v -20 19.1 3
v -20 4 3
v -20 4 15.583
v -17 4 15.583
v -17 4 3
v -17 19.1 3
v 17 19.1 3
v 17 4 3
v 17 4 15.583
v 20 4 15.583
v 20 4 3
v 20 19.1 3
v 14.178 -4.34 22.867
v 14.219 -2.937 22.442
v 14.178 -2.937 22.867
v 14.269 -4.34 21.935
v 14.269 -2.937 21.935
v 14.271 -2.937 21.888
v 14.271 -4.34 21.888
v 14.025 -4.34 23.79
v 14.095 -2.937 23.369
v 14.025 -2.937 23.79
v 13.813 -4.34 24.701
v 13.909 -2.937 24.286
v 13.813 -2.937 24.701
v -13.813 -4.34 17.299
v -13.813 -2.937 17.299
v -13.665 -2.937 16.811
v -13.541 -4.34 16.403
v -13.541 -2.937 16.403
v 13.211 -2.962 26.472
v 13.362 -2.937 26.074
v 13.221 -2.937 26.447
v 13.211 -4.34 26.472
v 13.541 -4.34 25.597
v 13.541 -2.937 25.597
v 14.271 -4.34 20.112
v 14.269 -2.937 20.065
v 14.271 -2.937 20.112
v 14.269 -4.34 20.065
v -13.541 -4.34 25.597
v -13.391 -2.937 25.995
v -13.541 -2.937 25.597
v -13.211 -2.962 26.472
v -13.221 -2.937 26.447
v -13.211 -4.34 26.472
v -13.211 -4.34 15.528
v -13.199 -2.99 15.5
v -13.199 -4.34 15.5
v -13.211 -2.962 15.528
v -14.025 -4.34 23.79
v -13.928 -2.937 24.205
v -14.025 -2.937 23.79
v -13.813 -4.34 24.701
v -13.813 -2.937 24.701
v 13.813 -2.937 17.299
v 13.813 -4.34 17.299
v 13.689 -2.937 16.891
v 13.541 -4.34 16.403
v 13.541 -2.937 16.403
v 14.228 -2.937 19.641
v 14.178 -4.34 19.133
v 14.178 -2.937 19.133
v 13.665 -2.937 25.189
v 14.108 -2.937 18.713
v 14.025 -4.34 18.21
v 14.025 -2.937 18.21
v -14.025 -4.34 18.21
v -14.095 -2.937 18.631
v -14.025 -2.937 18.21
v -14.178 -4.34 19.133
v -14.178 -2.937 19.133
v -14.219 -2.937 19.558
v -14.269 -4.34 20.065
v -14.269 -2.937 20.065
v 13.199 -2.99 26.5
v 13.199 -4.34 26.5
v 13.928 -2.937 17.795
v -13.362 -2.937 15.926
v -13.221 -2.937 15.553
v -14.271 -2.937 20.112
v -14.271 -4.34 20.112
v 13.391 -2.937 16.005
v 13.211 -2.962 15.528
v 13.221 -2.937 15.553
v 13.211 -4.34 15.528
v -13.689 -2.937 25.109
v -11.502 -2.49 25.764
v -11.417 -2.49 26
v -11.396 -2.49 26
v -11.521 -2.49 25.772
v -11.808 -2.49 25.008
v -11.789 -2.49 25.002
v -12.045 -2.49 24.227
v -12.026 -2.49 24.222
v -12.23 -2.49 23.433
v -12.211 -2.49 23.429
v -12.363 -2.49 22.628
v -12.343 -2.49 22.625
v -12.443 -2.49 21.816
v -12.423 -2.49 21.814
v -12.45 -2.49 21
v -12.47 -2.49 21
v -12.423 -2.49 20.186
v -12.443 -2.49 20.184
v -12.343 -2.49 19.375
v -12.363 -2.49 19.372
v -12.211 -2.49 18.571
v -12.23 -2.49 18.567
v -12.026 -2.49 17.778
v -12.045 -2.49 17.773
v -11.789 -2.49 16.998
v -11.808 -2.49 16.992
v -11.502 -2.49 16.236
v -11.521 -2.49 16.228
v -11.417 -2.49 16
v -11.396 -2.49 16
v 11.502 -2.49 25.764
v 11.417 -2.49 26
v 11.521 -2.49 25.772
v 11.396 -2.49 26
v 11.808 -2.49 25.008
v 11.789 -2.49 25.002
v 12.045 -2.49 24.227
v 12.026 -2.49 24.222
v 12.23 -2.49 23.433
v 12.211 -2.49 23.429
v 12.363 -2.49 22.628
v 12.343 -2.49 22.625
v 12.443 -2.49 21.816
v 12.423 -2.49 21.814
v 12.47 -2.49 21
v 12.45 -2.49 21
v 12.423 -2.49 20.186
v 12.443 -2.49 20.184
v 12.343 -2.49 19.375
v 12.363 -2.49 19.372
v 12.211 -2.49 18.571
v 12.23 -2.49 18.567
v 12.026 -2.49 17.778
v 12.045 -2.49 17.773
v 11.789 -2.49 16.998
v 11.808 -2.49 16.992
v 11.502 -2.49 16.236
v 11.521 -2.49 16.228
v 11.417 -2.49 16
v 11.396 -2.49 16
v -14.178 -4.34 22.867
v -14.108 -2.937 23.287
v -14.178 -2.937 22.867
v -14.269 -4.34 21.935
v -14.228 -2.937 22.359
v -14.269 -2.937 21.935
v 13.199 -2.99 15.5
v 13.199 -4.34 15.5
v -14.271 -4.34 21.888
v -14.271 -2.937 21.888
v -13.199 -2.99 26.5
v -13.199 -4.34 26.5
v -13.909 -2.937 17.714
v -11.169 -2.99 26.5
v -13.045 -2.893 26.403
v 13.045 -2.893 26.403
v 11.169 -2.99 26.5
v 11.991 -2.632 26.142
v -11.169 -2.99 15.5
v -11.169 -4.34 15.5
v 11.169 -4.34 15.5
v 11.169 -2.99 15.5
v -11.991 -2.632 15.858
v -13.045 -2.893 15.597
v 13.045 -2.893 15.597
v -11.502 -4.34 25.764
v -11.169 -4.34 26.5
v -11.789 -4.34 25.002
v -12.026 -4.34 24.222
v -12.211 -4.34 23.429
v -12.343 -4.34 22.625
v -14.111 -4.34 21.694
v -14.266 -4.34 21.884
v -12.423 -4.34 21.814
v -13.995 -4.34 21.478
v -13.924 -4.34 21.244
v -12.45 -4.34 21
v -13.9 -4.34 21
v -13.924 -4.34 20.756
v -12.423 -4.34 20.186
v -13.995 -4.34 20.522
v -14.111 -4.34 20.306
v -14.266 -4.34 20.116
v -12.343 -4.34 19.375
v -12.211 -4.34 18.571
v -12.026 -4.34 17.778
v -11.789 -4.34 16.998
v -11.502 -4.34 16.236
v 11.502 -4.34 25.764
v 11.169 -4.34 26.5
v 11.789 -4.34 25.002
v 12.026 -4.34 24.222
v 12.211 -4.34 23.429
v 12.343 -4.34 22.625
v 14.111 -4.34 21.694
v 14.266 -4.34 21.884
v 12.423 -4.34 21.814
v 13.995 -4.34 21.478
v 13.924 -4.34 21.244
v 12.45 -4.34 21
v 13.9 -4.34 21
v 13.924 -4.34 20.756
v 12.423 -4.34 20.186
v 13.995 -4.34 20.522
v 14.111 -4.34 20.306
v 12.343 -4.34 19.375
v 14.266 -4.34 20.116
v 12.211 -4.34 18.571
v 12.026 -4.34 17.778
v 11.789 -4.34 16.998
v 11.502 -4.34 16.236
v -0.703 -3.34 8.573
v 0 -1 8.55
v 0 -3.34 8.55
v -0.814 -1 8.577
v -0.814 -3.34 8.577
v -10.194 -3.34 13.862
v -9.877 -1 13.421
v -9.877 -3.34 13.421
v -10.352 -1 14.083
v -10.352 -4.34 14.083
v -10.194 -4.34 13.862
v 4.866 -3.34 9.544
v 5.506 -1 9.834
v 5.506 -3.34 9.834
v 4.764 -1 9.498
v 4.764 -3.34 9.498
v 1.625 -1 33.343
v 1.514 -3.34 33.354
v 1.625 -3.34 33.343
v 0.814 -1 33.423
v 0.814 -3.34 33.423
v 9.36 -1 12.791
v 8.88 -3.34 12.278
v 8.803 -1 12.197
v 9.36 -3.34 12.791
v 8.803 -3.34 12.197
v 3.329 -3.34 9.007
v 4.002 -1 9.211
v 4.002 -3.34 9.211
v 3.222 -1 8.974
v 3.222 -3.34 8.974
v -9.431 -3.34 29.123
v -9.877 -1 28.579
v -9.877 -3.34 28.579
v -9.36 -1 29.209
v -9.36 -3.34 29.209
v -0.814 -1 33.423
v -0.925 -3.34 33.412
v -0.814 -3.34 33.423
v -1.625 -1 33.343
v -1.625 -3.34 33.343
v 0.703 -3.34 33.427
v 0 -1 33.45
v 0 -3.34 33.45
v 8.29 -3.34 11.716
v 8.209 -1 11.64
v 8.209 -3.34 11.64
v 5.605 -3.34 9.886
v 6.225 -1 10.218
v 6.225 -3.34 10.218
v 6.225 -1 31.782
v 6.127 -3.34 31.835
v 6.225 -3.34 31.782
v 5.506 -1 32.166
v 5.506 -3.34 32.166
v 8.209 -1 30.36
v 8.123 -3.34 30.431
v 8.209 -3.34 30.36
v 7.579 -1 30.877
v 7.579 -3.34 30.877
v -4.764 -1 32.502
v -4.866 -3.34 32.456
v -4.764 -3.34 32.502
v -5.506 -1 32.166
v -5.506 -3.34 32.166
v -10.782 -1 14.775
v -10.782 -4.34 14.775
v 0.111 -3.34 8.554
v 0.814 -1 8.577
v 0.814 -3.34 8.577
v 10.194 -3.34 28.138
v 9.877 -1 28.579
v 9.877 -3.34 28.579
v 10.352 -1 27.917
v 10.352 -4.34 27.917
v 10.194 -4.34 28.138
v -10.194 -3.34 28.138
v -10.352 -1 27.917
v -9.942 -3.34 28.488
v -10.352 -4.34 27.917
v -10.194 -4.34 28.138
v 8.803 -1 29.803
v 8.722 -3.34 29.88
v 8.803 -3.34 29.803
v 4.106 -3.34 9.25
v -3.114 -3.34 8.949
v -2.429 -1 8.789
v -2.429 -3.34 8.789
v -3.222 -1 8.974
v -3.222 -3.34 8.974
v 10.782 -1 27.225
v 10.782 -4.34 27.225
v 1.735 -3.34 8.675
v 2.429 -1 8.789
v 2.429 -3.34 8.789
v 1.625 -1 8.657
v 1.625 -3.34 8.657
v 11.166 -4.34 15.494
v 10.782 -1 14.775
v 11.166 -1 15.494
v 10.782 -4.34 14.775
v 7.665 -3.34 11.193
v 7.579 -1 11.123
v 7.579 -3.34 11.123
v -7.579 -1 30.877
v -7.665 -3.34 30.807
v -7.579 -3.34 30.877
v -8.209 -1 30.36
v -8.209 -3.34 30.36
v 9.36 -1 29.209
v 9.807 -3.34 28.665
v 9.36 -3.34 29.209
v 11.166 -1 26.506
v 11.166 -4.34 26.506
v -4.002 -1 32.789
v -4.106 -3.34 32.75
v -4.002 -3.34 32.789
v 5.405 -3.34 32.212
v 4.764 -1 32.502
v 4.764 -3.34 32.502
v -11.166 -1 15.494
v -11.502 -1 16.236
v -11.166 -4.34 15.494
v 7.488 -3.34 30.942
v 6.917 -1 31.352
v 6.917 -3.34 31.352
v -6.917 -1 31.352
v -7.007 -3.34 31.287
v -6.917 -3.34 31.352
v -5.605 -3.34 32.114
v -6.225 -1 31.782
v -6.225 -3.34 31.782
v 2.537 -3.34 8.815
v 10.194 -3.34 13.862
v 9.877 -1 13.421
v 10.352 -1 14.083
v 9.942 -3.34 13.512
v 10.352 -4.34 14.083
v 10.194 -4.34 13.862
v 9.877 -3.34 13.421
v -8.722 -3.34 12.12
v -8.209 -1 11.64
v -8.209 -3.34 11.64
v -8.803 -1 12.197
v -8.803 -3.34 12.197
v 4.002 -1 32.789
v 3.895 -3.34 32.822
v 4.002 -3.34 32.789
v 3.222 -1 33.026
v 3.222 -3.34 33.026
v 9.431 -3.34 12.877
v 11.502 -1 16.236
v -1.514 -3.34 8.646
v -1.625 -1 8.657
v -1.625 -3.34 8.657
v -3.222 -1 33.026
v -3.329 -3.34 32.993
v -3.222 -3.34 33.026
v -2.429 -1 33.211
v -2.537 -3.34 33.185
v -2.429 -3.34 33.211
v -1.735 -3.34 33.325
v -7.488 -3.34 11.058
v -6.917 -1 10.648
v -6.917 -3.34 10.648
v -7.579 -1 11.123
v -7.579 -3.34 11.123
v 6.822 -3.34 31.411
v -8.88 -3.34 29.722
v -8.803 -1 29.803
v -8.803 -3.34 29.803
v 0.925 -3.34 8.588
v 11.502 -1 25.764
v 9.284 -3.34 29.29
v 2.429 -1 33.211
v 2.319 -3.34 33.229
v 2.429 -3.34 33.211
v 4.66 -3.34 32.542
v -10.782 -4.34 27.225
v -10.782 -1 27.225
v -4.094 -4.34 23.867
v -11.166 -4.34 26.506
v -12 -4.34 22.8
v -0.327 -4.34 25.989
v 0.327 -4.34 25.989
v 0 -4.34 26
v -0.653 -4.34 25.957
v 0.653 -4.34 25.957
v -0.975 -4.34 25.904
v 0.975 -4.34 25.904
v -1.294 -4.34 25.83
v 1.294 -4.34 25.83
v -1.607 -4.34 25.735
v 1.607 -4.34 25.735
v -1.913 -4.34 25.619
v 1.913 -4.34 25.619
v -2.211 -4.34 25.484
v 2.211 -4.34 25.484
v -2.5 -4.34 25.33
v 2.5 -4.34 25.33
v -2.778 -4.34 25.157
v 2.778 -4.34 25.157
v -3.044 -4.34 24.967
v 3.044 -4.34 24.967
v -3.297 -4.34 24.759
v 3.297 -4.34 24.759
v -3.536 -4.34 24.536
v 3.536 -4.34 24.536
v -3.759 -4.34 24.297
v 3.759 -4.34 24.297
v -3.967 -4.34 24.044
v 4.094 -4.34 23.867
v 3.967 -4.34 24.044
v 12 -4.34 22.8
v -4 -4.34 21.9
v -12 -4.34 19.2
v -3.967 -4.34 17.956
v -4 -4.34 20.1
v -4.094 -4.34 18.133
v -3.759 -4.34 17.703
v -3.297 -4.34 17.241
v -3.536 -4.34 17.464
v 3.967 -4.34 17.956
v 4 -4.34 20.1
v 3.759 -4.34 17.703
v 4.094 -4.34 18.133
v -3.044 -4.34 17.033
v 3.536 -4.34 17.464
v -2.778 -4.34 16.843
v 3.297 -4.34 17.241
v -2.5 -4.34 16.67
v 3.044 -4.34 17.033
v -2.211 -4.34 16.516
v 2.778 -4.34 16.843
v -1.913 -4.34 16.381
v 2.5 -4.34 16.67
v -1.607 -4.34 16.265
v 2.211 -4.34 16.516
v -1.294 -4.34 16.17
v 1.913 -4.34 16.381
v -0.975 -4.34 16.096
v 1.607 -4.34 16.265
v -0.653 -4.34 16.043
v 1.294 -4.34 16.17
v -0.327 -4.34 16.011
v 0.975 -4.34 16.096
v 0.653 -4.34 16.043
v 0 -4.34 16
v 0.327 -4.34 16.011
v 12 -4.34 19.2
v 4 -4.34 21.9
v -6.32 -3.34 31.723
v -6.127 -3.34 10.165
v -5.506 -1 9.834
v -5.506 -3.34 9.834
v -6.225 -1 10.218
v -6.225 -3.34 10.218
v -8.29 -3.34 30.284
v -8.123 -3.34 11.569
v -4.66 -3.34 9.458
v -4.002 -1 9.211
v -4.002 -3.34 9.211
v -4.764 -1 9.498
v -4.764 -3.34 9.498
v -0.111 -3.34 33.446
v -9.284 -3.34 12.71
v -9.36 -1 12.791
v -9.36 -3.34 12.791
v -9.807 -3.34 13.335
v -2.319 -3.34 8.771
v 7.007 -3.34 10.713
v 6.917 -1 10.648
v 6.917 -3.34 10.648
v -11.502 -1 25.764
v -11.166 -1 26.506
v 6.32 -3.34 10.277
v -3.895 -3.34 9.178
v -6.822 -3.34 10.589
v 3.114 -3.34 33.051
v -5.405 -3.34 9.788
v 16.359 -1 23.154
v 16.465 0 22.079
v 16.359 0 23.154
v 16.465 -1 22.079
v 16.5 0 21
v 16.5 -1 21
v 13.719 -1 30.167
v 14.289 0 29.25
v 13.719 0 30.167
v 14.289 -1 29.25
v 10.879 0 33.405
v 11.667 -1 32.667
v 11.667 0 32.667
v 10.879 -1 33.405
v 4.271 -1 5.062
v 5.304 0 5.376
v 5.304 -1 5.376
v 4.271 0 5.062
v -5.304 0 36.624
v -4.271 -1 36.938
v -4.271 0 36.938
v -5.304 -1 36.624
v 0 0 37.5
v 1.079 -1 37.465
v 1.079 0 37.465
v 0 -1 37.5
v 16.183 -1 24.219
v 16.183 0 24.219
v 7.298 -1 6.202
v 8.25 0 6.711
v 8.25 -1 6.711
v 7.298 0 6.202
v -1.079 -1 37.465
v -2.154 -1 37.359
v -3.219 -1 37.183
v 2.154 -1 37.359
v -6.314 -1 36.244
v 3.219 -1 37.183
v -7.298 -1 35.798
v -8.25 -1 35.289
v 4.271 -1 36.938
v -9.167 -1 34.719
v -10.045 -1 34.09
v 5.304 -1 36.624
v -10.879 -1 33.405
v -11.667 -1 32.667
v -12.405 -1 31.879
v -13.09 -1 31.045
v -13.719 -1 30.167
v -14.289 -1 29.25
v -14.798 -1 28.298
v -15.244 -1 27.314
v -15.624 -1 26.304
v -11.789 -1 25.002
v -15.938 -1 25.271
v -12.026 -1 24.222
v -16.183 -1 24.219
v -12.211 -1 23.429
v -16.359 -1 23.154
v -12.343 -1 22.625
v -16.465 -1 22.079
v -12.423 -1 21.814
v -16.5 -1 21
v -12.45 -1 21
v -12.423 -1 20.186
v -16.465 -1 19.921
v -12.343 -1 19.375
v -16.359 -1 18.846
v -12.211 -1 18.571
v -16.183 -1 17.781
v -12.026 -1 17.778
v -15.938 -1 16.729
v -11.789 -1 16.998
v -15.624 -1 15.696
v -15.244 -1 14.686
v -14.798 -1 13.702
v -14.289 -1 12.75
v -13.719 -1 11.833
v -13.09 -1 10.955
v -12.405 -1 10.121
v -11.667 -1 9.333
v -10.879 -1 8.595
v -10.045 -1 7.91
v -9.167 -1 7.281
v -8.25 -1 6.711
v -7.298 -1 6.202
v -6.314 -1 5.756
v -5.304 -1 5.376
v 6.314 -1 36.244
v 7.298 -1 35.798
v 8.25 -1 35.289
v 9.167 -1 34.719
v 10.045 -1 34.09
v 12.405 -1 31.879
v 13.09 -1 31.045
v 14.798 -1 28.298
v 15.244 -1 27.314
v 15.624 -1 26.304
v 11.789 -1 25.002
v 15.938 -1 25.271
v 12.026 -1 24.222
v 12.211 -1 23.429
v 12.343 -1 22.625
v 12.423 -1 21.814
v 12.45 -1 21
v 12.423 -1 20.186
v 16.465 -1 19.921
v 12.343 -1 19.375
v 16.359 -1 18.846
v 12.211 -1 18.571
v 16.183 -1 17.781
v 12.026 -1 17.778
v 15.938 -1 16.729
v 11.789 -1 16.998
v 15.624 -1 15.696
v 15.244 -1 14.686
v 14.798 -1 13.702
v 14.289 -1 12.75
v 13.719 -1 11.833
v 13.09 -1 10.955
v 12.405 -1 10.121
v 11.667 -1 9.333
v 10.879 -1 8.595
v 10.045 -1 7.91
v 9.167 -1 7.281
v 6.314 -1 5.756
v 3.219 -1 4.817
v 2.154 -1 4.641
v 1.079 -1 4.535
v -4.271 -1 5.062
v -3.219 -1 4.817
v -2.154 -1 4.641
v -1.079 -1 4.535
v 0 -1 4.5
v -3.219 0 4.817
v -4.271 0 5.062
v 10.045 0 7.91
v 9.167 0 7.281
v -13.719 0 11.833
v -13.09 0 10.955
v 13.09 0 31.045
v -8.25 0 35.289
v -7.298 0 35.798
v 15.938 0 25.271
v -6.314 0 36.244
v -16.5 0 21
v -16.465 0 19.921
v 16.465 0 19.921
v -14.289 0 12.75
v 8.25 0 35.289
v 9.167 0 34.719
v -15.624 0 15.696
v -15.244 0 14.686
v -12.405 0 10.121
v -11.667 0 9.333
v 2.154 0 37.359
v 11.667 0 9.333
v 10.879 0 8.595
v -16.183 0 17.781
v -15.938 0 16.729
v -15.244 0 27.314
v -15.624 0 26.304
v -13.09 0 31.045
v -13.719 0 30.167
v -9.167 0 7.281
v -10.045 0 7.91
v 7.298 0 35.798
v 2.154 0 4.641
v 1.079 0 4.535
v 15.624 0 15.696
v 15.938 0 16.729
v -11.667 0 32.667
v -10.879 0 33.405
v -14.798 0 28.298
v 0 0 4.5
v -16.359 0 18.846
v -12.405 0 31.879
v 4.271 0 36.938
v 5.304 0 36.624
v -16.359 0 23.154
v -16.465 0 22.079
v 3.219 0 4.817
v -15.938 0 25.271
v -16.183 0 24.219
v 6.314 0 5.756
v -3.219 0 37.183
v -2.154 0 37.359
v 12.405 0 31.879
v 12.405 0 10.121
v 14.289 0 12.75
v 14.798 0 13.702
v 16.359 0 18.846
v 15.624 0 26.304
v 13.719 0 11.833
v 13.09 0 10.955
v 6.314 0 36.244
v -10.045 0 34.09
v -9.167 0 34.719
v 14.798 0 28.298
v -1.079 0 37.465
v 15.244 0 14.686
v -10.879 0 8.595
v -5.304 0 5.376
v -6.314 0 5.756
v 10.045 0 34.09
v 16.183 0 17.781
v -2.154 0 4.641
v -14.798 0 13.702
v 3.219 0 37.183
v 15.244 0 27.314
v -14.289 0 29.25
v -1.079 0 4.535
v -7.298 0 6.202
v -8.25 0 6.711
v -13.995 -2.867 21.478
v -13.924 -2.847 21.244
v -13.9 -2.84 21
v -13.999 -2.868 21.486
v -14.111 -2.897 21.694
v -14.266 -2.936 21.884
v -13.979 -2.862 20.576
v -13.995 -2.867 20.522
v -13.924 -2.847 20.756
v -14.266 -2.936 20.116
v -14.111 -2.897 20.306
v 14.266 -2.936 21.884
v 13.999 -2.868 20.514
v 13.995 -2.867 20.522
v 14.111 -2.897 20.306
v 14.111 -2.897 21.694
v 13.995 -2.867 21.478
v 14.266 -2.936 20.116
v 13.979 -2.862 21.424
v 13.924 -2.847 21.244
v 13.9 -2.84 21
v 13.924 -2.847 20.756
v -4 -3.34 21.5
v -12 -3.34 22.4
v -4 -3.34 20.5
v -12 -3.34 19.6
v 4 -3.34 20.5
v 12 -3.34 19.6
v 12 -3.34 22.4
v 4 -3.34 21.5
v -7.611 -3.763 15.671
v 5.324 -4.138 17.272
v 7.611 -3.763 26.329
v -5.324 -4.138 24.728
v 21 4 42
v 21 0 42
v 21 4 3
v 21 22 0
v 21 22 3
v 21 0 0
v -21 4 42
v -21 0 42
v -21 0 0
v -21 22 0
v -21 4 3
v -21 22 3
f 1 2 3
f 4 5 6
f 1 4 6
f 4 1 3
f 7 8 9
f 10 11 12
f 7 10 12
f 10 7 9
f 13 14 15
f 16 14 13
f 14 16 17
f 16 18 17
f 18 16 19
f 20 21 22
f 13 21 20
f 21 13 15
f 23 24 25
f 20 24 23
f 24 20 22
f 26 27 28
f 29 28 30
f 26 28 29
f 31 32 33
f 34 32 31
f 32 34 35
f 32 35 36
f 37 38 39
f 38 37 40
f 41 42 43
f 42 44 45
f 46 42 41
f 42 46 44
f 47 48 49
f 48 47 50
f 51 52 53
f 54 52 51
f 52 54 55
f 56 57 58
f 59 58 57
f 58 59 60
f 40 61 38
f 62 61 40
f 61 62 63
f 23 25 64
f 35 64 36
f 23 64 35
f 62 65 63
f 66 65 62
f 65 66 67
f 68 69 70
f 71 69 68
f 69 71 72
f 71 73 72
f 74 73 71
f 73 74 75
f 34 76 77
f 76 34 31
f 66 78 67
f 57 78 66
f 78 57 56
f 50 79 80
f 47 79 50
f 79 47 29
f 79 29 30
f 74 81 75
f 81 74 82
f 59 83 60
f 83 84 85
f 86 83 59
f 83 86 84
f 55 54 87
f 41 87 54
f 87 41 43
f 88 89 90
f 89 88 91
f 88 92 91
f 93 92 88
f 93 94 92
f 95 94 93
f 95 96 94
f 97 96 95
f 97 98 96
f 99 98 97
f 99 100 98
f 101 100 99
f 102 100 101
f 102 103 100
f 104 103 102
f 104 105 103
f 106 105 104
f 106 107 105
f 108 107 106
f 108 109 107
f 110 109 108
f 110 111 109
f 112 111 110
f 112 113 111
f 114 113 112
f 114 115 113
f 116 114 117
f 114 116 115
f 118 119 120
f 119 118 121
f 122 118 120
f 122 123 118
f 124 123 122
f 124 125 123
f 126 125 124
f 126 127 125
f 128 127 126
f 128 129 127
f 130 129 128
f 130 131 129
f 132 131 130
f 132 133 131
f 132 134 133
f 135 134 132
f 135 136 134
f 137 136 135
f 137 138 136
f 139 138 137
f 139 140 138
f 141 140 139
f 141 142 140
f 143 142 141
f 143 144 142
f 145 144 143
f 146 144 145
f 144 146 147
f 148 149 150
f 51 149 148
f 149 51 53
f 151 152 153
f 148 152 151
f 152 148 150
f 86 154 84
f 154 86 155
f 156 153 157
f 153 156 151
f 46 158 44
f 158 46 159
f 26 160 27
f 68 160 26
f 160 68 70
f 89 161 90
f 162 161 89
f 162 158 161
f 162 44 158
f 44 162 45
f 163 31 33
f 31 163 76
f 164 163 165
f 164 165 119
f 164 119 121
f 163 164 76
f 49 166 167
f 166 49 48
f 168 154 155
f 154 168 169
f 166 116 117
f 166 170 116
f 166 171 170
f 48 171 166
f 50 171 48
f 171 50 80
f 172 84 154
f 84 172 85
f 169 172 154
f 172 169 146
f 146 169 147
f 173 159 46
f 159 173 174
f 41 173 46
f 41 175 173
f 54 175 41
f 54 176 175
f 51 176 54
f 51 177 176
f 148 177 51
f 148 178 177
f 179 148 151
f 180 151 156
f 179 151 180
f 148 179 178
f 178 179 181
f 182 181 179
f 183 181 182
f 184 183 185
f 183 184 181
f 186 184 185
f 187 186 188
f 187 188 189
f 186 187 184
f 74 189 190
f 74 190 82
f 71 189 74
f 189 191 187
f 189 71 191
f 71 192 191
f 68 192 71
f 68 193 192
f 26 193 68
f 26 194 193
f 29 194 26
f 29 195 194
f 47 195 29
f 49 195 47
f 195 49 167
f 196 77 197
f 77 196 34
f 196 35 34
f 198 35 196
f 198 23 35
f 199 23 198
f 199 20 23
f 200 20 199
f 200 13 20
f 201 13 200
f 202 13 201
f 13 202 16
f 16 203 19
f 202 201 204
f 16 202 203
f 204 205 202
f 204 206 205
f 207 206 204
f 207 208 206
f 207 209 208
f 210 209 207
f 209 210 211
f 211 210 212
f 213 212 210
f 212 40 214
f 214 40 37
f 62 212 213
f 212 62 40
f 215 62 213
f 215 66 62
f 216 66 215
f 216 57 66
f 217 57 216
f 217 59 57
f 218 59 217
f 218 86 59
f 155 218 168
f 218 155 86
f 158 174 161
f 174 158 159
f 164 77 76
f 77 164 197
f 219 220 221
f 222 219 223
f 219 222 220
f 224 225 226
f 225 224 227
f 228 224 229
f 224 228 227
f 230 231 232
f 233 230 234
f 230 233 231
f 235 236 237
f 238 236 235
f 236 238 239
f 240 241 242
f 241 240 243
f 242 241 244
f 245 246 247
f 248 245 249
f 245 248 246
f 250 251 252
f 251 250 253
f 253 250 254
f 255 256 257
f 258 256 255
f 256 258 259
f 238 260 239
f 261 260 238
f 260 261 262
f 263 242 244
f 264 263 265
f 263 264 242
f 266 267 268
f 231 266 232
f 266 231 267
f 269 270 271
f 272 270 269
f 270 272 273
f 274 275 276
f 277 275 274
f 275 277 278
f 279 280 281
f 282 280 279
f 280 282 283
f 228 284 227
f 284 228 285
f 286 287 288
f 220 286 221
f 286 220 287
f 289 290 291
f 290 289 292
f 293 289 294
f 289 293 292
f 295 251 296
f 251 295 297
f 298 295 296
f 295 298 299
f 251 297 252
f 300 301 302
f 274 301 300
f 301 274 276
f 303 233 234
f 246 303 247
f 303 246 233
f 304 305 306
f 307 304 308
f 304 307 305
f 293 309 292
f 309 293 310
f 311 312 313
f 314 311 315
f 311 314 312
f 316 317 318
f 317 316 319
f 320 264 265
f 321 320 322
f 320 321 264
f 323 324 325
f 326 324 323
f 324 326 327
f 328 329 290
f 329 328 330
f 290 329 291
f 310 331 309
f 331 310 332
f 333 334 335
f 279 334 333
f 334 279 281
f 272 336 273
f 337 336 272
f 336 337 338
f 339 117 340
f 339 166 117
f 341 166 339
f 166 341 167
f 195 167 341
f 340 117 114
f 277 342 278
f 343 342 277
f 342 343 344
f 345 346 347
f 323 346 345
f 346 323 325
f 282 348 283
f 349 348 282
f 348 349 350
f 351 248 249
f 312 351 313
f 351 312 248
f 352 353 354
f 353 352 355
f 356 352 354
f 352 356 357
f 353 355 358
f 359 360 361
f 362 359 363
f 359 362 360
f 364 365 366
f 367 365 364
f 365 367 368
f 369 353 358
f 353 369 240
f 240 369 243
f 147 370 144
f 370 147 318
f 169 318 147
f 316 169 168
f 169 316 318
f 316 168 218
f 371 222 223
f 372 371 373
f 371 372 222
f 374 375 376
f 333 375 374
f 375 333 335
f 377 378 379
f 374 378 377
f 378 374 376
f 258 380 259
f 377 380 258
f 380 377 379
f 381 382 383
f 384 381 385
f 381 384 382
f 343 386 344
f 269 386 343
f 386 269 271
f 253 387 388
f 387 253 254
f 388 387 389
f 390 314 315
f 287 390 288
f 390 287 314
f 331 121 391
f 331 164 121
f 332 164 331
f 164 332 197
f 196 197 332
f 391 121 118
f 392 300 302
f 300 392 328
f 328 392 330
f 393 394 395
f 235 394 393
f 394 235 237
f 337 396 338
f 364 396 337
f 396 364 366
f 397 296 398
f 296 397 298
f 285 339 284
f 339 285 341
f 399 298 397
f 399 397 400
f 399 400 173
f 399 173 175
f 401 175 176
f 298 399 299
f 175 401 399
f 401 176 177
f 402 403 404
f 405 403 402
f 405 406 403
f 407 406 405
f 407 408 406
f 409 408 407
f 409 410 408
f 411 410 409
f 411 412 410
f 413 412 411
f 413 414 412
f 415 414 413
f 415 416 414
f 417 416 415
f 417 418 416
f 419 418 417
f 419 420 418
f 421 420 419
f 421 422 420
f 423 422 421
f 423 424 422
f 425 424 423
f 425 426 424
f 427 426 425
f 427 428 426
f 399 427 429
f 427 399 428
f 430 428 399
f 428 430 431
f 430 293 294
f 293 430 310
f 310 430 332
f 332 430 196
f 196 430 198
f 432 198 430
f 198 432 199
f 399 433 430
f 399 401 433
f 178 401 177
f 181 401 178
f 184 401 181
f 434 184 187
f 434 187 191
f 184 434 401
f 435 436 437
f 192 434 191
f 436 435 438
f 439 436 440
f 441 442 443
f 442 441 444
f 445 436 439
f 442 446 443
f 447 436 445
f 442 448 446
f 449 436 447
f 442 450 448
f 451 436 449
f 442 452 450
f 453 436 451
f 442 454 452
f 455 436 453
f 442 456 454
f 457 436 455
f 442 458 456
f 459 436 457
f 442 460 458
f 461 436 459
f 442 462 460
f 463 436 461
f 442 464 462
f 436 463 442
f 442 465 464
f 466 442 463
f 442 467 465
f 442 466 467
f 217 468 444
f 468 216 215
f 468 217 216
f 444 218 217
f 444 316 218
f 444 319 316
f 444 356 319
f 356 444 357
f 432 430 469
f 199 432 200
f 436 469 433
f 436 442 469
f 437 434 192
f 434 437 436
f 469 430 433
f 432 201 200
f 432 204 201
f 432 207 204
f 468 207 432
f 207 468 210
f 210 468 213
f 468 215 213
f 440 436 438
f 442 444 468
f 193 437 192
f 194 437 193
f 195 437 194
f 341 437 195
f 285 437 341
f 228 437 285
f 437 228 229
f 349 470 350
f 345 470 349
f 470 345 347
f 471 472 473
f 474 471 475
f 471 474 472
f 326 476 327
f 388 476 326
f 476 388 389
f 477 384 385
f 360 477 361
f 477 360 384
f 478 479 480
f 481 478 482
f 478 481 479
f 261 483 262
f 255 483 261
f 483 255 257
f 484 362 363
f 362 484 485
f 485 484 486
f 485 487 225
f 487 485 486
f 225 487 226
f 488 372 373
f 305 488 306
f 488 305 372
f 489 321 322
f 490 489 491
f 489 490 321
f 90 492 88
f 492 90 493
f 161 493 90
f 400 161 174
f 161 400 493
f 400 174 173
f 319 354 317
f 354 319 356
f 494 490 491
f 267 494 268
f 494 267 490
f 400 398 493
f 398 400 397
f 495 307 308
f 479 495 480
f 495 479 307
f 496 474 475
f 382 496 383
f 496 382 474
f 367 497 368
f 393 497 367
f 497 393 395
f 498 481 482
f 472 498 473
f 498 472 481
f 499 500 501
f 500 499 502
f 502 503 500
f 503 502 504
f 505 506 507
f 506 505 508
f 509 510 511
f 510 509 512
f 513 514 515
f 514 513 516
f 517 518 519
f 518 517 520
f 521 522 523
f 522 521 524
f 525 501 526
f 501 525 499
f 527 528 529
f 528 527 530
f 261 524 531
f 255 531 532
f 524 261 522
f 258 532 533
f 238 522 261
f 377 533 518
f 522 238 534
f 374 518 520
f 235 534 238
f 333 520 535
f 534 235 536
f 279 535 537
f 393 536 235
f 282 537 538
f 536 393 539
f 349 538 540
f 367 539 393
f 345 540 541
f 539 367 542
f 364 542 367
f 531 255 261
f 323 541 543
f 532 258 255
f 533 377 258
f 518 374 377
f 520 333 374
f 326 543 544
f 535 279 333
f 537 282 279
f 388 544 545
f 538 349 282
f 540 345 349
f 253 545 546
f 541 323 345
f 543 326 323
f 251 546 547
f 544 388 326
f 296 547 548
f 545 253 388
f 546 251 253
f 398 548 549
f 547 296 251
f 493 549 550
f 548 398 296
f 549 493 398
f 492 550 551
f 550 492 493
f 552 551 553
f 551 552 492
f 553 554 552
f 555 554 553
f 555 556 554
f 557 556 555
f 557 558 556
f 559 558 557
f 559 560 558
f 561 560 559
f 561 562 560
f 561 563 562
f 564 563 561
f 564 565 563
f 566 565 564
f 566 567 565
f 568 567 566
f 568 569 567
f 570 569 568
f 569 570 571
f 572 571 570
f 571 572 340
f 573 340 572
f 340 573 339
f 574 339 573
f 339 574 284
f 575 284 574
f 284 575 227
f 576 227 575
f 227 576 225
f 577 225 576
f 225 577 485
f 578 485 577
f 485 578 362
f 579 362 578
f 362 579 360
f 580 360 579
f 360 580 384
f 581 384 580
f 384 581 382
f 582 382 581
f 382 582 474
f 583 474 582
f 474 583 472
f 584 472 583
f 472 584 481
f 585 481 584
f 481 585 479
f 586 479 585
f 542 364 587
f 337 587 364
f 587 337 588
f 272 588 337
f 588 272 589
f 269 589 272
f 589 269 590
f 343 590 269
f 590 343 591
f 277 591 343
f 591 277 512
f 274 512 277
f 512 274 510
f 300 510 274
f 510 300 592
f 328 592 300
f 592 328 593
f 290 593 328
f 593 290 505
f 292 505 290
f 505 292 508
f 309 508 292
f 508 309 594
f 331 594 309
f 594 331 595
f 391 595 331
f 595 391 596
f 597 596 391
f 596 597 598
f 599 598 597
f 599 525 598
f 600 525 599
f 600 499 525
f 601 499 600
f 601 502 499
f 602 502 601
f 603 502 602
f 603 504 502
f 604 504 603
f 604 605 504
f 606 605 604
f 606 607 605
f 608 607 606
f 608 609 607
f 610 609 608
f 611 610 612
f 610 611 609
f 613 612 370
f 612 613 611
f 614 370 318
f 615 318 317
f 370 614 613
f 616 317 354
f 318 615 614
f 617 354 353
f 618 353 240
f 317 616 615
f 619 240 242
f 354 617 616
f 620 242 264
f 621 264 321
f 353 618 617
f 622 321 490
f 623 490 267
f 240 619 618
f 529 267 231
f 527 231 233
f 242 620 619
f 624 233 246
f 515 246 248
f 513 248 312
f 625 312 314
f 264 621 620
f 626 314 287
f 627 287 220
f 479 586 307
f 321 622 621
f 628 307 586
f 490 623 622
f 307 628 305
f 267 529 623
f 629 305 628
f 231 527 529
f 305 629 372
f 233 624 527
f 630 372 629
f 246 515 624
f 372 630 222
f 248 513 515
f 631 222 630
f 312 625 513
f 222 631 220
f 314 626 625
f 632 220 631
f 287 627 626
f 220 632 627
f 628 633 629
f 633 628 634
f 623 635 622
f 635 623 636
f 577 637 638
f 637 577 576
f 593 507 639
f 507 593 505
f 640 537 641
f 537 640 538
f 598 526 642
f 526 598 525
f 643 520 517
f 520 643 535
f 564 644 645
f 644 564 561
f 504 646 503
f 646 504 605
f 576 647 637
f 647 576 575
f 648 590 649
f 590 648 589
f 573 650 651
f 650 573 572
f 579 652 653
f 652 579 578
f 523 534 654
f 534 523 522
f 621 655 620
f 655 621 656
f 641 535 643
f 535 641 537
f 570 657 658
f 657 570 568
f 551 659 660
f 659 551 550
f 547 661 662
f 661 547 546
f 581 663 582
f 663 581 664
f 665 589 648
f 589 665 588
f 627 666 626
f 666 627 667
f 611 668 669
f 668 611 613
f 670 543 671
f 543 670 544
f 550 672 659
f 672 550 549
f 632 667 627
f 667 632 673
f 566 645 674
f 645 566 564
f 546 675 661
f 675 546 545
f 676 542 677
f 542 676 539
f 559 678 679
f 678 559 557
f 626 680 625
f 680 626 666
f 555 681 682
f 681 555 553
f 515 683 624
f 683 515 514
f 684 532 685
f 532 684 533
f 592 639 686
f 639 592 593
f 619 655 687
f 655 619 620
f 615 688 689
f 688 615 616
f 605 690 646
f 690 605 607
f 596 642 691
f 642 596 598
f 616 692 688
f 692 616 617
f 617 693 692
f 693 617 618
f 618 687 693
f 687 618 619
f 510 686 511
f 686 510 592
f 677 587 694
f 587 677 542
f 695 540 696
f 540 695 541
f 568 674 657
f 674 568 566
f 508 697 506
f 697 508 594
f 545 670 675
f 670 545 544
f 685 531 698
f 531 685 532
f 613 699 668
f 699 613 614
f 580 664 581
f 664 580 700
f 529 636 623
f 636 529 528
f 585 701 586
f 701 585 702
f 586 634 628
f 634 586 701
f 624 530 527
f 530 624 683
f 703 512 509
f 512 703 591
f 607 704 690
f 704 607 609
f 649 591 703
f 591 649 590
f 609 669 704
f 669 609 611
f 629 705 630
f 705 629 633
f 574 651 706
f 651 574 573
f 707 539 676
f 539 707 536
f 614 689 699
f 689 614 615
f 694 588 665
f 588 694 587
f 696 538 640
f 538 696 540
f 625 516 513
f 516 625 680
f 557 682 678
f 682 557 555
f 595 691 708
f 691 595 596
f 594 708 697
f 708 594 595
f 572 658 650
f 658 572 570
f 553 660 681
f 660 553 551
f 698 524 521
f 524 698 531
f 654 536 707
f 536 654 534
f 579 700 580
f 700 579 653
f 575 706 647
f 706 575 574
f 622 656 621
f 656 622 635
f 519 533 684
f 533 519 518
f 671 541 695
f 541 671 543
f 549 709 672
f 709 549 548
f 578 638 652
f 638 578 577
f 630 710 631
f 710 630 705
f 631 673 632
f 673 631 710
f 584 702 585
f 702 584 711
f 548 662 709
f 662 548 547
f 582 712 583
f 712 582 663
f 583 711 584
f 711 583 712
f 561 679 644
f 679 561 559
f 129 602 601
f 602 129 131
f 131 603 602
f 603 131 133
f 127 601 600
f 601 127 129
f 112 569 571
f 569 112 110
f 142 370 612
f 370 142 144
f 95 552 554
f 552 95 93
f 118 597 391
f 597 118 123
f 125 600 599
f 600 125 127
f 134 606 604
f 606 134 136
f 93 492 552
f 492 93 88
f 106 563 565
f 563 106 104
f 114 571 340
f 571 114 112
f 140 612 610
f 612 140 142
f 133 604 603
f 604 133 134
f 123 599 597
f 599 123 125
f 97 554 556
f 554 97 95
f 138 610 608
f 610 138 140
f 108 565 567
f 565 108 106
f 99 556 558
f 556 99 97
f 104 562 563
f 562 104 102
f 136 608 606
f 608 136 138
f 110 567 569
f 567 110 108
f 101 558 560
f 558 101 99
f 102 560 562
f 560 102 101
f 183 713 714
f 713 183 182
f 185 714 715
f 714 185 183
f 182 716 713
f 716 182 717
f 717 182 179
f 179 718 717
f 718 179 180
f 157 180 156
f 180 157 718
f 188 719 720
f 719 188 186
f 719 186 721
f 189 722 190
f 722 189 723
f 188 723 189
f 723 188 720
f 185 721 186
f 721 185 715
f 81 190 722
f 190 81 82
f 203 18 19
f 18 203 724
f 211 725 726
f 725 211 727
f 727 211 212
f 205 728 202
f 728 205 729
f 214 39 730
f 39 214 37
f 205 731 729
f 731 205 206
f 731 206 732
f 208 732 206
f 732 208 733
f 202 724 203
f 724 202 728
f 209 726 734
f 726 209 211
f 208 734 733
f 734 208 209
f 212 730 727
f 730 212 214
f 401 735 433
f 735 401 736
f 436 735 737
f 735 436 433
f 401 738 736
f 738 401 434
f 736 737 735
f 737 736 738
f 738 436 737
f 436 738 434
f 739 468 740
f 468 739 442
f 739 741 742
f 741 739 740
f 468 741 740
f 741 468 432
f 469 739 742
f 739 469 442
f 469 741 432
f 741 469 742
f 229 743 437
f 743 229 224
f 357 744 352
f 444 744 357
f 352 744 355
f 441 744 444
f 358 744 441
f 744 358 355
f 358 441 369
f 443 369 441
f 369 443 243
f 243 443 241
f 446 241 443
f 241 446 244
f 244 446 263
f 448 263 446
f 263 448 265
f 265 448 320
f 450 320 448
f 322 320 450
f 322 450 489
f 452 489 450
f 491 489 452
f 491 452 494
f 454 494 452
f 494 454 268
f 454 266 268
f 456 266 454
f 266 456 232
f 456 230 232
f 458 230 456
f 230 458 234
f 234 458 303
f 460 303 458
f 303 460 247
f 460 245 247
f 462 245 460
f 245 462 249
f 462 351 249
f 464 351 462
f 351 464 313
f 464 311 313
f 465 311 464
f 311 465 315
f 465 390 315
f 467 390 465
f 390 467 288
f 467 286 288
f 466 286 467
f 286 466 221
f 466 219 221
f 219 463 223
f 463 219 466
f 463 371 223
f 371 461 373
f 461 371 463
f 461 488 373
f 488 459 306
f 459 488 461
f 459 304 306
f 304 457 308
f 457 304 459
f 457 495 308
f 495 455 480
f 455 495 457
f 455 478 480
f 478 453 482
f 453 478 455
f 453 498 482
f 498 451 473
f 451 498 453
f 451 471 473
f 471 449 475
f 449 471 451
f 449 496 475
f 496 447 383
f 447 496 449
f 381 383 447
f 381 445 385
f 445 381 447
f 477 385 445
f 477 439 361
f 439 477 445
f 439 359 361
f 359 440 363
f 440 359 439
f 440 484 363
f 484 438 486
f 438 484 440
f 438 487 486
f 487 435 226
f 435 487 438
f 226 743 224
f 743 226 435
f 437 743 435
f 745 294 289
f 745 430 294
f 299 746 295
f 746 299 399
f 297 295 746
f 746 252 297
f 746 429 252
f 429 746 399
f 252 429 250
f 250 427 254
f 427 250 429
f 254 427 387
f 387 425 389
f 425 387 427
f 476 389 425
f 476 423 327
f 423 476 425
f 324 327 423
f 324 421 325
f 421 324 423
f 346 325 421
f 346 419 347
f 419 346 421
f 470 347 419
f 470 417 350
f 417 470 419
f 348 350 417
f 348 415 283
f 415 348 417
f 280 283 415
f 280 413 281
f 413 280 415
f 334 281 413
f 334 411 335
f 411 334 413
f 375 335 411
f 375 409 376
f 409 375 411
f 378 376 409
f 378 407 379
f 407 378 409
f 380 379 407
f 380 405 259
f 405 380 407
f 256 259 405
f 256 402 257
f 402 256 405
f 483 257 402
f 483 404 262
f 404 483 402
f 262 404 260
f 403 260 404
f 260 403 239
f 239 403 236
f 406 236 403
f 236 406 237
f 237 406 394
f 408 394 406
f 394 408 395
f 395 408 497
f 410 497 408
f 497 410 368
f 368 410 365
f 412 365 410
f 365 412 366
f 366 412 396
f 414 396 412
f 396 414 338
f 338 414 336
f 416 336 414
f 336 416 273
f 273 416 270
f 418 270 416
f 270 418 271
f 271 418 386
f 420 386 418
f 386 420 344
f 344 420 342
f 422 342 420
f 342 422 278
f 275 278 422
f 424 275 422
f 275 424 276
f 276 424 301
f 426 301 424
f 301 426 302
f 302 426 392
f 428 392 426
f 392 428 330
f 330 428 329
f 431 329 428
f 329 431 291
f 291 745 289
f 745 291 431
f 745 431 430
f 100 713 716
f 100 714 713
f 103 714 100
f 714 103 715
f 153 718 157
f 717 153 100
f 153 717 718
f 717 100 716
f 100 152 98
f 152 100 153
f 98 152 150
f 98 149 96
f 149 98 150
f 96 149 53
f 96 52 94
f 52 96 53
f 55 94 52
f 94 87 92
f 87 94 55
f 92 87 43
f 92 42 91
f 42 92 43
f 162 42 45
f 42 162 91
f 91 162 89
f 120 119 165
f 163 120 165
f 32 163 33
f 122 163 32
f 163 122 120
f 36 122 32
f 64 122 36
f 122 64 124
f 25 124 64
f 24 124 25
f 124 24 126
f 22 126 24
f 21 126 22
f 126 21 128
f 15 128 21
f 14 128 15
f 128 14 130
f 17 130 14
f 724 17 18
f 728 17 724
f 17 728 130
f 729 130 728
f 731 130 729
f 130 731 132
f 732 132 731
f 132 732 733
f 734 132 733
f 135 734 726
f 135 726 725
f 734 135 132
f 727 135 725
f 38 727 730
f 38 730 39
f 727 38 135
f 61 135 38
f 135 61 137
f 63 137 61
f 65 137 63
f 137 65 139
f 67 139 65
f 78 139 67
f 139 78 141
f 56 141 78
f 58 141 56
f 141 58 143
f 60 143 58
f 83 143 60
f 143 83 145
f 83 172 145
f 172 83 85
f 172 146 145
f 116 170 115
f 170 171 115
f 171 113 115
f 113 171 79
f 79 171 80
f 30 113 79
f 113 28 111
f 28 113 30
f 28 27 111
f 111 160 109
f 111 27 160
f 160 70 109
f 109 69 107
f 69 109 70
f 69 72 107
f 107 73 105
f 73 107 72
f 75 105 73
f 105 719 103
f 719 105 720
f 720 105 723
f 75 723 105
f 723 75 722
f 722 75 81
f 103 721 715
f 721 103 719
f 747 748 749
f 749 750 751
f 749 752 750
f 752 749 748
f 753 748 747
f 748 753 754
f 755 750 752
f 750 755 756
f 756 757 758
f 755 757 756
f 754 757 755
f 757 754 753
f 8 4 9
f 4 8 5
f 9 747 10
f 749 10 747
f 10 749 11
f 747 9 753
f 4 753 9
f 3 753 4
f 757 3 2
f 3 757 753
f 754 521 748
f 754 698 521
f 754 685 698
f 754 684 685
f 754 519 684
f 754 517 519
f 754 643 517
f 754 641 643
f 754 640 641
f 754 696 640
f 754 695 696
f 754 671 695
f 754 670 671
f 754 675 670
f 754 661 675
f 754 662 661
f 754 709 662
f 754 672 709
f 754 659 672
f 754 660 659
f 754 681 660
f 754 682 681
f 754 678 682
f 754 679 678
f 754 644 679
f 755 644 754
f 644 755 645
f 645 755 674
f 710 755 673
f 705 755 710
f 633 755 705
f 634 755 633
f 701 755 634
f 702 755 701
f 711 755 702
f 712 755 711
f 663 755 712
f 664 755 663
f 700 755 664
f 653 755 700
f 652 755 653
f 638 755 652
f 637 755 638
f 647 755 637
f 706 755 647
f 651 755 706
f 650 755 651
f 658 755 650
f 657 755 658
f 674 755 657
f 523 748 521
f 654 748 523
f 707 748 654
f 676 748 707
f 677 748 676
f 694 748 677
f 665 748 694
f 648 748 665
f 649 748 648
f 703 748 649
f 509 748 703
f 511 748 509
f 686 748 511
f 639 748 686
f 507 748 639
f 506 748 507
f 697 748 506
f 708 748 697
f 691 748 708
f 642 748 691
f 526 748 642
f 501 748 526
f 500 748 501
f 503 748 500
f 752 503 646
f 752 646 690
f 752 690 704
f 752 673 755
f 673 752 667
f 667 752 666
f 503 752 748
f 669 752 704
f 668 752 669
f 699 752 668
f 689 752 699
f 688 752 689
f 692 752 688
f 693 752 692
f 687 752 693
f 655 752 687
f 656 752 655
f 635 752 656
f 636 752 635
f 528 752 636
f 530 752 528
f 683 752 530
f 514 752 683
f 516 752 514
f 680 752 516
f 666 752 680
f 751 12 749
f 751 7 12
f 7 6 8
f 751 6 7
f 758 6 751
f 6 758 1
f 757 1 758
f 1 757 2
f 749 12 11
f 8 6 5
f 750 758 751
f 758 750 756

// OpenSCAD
// file: ../../lib/garmin_cleat.scad
// ============================================================
// Garmin-style quarter-turn cleat (male, "device side")
// Part of ControllerCyclingMounts.  Use with:  use <../../lib/garmin_cleat.scad>
//
// Dimensions measured from community cleats (DiTEC case,
// ReverseGarminCustom, Shiny Allis-Bojo) which share the same
// geometry within ~0.2 mm.
//
// Built pointing up (+Z) from z = 0, which is the surface it sits on.
// Lugs lie along X when angle = 0.
//
// v2 changes (after the first test print would drop in but not twist):
//   - lug undersides are chamfered: the gap for the mount's lip is
//     neck_h (1.5) at the neck and neck_h + lug_chamfer (1.95) at the
//     lug tip, like the DiTEC reference. This also removes the flat
//     1.8 mm overhang that sagged when the cleat was printed flat.
//   - the side edges of each lug are chamfered underneath
//     (lug_lead_in) so the mount's lip slides under easily.
//   - lugs are thicker at the root (lug_t 1.85) so the outer face sits
//     3.35 mm above the seat, as on the reference cleats.
// ============================================================

// Outer face height of the cleat above its mounting surface
function garmin_cleat_height(pedestal_h = 1.0, neck_h = 1.5, lug_t = 1.85) =
    pedestal_h + neck_h + lug_t;

module _gc_wedge2d(s, r0, r1, w0, w1) {
    polygon([[s * r0, w0/2], [s * r1, w1/2], [s * r1, -w1/2], [s * r0, -w0/2]]);
}

module garmin_cleat(angle = 0,
                    pedestal_d = 33, pedestal_h = 1.0,   // flat seat for the mount's lip
                    neck_d = 24.9, neck_h = 1.5,         // gap for the mount's lip, at the neck
                    lug_d = 28.6, lug_w = 11.0, lug_t = 1.85,  // lug_t measured at the neck
                    lug_chamfer = 0.45,   // extra gap at the lug tip (underside slope)
                    lug_lead_in = 0.5,    // 45-deg chamfer under each lug's side edges
                    lug_notch_d = 2.5, lug_notch_depth = 0.4,
                    // detent grooves along the lugs (springs click in when locked)
                    groove_r0 = 4, groove_r1 = 12, groove_w0 = 1.0, groove_w1 = 2.8,
                    groove_depth = 1.0, groove_draft = 0.4,
                    // lead-in ramps 90 deg from the lugs (springs sit here on insert)
                    ramp_r0 = 5, ramp_drop = 1.0, ramp_half_angle = 55) {
    eps = 0.01;
    z_lug = pedestal_h + neck_h;          // lug underside at the neck
    zt = z_lug + lug_t;                   // outer face
    r_n = neck_d / 2;
    r_l = lug_d / 2;
    difference() {
        union() {
            cylinder(d = pedestal_d, h = pedestal_h + eps, $fn = 96);
            translate([0, 0, pedestal_h]) cylinder(d = neck_d, h = neck_h + eps, $fn = 96);
            translate([0, 0, z_lug]) {
                cylinder(d = neck_d, h = lug_t, $fn = 96);
                rotate([0, 0, angle]) intersection() {
                    cylinder(d = lug_d, h = lug_t, $fn = 96);
                    // lug strip with chamfered lower side edges
                    rotate([90, 0, 90]) translate([0, 0, -r_l - 1])
                        linear_extrude(lug_d + 2)
                            polygon([[-lug_w/2 + lug_lead_in, 0], [lug_w/2 - lug_lead_in, 0],
                                     [lug_w/2, lug_lead_in], [lug_w/2, lug_t],
                                     [-lug_w/2, lug_t], [-lug_w/2, lug_lead_in]]);
                }
            }
        }
        // sloped lug underside: gap grows from neck_h at the neck to
        // neck_h + lug_chamfer at the lug tip
        if (lug_chamfer > 0) {
            r_far = r_l + 2;
            z_far = z_lug + lug_chamfer * (r_far - r_n) / (r_l - r_n);
            rotate_extrude($fn = 96)
                polygon([[r_n + 0.02, z_lug - eps], [r_n + 0.02, z_lug], [r_far, z_far], [r_far, z_lug - eps]]);
        }
        rotate([0, 0, angle]) {
            for (s = [-1, 1])
                translate([s * (r_l + lug_notch_d/2 - lug_notch_depth), 0, pedestal_h + neck_h / 2])
                    cylinder(d = lug_notch_d, h = 10, $fn = 32);
            for (s = [-1, 1]) hull() {
                translate([0, 0, zt - groove_depth])
                    linear_extrude(eps) _gc_wedge2d(s, groove_r0, groove_r1, groove_w0, groove_w1);
                translate([0, 0, zt])
                    linear_extrude(1) _gc_wedge2d(s, groove_r0, groove_r1,
                                                  groove_w0 + 2 * groove_draft, groove_w1 + 2 * groove_draft);
            }
            r_far2 = r_l + 2;
            z_far2 = zt - ramp_drop * (r_far2 - ramp_r0) / (r_n - ramp_r0);
            for (s = [-1, 1]) intersection() {
                rotate([0, 0, s * 90]) linear_extrude(zt + 5)
                    polygon([[0, 0],
                             for (a = [-ramp_half_angle : 5 : ramp_half_angle])
                                 r_far2 * 1.5 * [cos(a), sin(a)]]);
                rotate_extrude($fn = 96)
                    polygon([[ramp_r0, zt], [r_far2, z_far2], [r_far2, zt + 1], [ramp_r0, zt + 1]]);
            }
        }
    }
}

// Cleat test piece.
//   standing = true (default): a vertical plate on a foot, so the cleat
//     prints sideways exactly the way it does on the Joy-Con grip
//     (cleat axis horizontal, lugs horizontal). This is the
//     representative test.
//   standing = false: cleat pointing up on a flat 38 mm disc.
module garmin_cleat_test(standing = true, angle = 0) {
    plate_t = 4;
    if (standing) {
        w = 42; h = 42; c = 21;        // plate size, cleat centre height
        foot_d = 22;
        // vertical plate in the XZ plane; cleat sticks out toward -Y
        translate([-w/2, 0, 0]) cube([w, plate_t, h]);
        translate([-w/2, 0, 0]) cube([w, foot_d, 3]);           // foot behind the plate
        for (x = [-w/2 + 1, w/2 - 4])                           // gussets
            translate([x, plate_t - 0.5, 1]) rotate([90, 0, 90])
                linear_extrude(3) polygon([[0, 0], [foot_d - plate_t, 0], [0, 15]]);
        translate([0, 0.01, c]) rotate([90, 0, 0]) garmin_cleat(angle = angle);
    } else {
        translate([0, 0, 2]) garmin_cleat(angle = angle);
        cylinder(d = 38, h = 2.01, $fn = 96);
    }
}
// main file
// ============================================================
// Garmin quarter-turn cleat test print  (ControllerCyclingMounts)
// The male quarter-turn cleat used by the Garmin-compatible mounts
// in this repo, on a small plate. Print it and try it in your
// Garmin / Wahoo / other quarter-turn mount before a full mount.
//
// Print: as exported. The default stands the plate up so the cleat
//        prints sideways, exactly as it does on the Joy-Con grip.
//        No supports. Set standing = false for a flat version.
//
// What to check:
//   - The cleat drops into the mount rotated 90 degrees.
//   - It twists a quarter turn with firm, smooth resistance and
//     clicks when straight (springs drop into the grooves).
//   - Once locked it doesn't rattle or lift out.
//   Won't twist: clean any strings/sag under the lugs; if still
//     tight, raise neck_h in ../lib/garmin_cleat.scad by 0.1-0.2.
//   Loose / rattles: lower neck_h by 0.1.
// ============================================================
use <../../lib/garmin_cleat.scad>

/* [Test piece] */
standing = true;   // true = print like the grip does (recommended)
angle    = 0;      // lug direction

garmin_cleat_test(standing = standing, angle = angle);
